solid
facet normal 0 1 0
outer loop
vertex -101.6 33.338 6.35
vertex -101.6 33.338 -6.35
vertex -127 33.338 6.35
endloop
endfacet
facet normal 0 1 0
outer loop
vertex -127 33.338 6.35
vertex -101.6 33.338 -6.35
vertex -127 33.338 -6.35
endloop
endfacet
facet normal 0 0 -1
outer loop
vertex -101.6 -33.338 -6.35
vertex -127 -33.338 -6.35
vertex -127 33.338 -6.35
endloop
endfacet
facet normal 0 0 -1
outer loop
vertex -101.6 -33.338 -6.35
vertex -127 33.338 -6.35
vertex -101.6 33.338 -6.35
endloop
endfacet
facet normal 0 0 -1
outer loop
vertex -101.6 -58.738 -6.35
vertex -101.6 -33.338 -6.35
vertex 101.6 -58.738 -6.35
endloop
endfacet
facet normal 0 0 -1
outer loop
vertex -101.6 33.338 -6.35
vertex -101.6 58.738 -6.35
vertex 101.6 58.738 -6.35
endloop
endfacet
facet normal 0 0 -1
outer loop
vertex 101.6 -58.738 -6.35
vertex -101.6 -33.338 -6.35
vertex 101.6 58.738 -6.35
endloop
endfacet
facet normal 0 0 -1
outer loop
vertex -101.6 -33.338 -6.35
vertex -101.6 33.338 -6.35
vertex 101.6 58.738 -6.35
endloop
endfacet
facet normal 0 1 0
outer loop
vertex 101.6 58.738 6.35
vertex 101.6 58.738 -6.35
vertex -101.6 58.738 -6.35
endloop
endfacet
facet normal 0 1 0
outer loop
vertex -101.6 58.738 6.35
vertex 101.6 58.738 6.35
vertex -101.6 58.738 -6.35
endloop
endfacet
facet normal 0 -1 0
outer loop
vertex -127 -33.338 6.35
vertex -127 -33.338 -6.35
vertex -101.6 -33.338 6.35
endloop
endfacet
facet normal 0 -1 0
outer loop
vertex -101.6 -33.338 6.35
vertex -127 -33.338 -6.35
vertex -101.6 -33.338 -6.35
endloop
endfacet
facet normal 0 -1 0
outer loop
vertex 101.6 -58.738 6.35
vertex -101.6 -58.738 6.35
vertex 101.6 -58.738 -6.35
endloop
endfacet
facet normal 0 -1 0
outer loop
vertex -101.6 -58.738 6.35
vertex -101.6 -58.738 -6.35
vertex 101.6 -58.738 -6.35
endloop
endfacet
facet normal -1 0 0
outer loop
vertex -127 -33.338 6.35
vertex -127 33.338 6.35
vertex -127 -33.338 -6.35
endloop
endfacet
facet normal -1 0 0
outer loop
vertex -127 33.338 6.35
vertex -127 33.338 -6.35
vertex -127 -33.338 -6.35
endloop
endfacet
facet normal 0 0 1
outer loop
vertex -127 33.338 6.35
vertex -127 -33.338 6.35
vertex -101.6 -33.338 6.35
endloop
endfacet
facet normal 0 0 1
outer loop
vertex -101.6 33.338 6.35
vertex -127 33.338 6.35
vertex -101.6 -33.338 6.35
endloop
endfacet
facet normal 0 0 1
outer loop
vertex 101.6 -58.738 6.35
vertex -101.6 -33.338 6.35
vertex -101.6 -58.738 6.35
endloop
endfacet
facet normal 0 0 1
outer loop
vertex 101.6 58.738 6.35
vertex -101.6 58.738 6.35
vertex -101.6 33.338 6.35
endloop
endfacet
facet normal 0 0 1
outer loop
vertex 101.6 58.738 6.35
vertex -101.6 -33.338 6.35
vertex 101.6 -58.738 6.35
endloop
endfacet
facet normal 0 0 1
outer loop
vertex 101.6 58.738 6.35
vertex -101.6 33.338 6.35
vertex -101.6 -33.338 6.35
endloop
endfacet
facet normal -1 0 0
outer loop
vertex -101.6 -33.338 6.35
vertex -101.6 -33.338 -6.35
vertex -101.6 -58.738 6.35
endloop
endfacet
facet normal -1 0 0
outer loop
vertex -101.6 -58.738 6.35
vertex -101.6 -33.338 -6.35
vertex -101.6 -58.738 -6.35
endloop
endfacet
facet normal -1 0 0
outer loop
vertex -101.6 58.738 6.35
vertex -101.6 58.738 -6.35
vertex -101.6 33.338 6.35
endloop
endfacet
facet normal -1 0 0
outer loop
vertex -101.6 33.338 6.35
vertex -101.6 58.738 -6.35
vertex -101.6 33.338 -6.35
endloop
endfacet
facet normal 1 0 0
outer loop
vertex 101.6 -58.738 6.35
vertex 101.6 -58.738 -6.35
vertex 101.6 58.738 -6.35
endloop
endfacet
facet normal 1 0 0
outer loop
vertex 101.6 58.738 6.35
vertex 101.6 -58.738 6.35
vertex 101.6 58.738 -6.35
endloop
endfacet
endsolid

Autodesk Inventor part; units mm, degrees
ref_plane "YZ Plane" through (0, 0, 0) normal (1, 0, 0) x (0, 1, 0)
ref_plane "XZ Plane" through (0, 0, 0) normal (0, 1, 0) x (-1, 0, 0)
ref_plane "XY Plane" through (0, 0, 0) normal (0, 0, 1) x (1, 0, 0)
sketch "Sketch1" plane through (0, 0, 0) normal (0, 0, 1) x (1, 0, 0)
  line L0 (-101.6, -58.7375) -> (101.6, -58.7375)
  line L1 (101.6, -58.7375) -> (101.6, 58.7375)
  line L2 (101.6, 58.7375) -> (-101.6, 58.7375)
  line L3 (-101.6, 58.7375) -> (-101.6, -58.7375)
  line L4 (-101.6, -58.7375) -> (101.6, 58.7375) construction
  line L5 (101.6, -58.7375) -> (-101.6, 58.7375) construction
  line L6 (-101.6, -33.3375) -> (-101.6, 33.3375)
  line L7 (-101.6, 33.3375) -> (-127, 33.3375)
  line L8 (-127, 33.3375) -> (-127, -33.3375)
  line L9 (-127, -33.3375) -> (-101.6, -33.3375)
  point P0 (0, 0)
  dimension "d0" = 203.2
  dimension "d1" = 117.475
  dimension "d2" = 25.4
  dimension "d3" = 25.4
  dimension "d4" = 25.4
extrude "Extrusion1" add sketch "Sketch1" along normal mid plane 12.7
properties part number "1214_Gantry Support Rib_V1" material "GFRP"
